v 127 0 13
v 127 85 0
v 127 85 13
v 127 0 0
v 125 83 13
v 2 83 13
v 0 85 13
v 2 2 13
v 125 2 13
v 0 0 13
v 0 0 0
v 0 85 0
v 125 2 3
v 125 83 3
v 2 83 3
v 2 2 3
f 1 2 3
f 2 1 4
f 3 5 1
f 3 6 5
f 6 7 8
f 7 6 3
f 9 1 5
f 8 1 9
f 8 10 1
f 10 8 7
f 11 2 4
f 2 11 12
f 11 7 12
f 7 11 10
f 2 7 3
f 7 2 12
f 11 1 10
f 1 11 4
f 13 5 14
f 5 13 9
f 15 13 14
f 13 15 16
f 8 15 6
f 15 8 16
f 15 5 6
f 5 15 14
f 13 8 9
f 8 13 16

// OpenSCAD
// Pipette rack tray. Origin at corner of outside; Z up.
// Assumption: wall pocket goes down to the top of the 3 mm base.
base = 3; wall = 2; wall_h = 10;
in_x = 123; in_y = 81;   // rack 122x80 + 0.5 clearance per side
difference() {
    cube([in_x + 2*wall, in_y + 2*wall, base + wall_h]);
    translate([wall, wall, base]) cube([in_x, in_y, wall_h + 1]);
}
